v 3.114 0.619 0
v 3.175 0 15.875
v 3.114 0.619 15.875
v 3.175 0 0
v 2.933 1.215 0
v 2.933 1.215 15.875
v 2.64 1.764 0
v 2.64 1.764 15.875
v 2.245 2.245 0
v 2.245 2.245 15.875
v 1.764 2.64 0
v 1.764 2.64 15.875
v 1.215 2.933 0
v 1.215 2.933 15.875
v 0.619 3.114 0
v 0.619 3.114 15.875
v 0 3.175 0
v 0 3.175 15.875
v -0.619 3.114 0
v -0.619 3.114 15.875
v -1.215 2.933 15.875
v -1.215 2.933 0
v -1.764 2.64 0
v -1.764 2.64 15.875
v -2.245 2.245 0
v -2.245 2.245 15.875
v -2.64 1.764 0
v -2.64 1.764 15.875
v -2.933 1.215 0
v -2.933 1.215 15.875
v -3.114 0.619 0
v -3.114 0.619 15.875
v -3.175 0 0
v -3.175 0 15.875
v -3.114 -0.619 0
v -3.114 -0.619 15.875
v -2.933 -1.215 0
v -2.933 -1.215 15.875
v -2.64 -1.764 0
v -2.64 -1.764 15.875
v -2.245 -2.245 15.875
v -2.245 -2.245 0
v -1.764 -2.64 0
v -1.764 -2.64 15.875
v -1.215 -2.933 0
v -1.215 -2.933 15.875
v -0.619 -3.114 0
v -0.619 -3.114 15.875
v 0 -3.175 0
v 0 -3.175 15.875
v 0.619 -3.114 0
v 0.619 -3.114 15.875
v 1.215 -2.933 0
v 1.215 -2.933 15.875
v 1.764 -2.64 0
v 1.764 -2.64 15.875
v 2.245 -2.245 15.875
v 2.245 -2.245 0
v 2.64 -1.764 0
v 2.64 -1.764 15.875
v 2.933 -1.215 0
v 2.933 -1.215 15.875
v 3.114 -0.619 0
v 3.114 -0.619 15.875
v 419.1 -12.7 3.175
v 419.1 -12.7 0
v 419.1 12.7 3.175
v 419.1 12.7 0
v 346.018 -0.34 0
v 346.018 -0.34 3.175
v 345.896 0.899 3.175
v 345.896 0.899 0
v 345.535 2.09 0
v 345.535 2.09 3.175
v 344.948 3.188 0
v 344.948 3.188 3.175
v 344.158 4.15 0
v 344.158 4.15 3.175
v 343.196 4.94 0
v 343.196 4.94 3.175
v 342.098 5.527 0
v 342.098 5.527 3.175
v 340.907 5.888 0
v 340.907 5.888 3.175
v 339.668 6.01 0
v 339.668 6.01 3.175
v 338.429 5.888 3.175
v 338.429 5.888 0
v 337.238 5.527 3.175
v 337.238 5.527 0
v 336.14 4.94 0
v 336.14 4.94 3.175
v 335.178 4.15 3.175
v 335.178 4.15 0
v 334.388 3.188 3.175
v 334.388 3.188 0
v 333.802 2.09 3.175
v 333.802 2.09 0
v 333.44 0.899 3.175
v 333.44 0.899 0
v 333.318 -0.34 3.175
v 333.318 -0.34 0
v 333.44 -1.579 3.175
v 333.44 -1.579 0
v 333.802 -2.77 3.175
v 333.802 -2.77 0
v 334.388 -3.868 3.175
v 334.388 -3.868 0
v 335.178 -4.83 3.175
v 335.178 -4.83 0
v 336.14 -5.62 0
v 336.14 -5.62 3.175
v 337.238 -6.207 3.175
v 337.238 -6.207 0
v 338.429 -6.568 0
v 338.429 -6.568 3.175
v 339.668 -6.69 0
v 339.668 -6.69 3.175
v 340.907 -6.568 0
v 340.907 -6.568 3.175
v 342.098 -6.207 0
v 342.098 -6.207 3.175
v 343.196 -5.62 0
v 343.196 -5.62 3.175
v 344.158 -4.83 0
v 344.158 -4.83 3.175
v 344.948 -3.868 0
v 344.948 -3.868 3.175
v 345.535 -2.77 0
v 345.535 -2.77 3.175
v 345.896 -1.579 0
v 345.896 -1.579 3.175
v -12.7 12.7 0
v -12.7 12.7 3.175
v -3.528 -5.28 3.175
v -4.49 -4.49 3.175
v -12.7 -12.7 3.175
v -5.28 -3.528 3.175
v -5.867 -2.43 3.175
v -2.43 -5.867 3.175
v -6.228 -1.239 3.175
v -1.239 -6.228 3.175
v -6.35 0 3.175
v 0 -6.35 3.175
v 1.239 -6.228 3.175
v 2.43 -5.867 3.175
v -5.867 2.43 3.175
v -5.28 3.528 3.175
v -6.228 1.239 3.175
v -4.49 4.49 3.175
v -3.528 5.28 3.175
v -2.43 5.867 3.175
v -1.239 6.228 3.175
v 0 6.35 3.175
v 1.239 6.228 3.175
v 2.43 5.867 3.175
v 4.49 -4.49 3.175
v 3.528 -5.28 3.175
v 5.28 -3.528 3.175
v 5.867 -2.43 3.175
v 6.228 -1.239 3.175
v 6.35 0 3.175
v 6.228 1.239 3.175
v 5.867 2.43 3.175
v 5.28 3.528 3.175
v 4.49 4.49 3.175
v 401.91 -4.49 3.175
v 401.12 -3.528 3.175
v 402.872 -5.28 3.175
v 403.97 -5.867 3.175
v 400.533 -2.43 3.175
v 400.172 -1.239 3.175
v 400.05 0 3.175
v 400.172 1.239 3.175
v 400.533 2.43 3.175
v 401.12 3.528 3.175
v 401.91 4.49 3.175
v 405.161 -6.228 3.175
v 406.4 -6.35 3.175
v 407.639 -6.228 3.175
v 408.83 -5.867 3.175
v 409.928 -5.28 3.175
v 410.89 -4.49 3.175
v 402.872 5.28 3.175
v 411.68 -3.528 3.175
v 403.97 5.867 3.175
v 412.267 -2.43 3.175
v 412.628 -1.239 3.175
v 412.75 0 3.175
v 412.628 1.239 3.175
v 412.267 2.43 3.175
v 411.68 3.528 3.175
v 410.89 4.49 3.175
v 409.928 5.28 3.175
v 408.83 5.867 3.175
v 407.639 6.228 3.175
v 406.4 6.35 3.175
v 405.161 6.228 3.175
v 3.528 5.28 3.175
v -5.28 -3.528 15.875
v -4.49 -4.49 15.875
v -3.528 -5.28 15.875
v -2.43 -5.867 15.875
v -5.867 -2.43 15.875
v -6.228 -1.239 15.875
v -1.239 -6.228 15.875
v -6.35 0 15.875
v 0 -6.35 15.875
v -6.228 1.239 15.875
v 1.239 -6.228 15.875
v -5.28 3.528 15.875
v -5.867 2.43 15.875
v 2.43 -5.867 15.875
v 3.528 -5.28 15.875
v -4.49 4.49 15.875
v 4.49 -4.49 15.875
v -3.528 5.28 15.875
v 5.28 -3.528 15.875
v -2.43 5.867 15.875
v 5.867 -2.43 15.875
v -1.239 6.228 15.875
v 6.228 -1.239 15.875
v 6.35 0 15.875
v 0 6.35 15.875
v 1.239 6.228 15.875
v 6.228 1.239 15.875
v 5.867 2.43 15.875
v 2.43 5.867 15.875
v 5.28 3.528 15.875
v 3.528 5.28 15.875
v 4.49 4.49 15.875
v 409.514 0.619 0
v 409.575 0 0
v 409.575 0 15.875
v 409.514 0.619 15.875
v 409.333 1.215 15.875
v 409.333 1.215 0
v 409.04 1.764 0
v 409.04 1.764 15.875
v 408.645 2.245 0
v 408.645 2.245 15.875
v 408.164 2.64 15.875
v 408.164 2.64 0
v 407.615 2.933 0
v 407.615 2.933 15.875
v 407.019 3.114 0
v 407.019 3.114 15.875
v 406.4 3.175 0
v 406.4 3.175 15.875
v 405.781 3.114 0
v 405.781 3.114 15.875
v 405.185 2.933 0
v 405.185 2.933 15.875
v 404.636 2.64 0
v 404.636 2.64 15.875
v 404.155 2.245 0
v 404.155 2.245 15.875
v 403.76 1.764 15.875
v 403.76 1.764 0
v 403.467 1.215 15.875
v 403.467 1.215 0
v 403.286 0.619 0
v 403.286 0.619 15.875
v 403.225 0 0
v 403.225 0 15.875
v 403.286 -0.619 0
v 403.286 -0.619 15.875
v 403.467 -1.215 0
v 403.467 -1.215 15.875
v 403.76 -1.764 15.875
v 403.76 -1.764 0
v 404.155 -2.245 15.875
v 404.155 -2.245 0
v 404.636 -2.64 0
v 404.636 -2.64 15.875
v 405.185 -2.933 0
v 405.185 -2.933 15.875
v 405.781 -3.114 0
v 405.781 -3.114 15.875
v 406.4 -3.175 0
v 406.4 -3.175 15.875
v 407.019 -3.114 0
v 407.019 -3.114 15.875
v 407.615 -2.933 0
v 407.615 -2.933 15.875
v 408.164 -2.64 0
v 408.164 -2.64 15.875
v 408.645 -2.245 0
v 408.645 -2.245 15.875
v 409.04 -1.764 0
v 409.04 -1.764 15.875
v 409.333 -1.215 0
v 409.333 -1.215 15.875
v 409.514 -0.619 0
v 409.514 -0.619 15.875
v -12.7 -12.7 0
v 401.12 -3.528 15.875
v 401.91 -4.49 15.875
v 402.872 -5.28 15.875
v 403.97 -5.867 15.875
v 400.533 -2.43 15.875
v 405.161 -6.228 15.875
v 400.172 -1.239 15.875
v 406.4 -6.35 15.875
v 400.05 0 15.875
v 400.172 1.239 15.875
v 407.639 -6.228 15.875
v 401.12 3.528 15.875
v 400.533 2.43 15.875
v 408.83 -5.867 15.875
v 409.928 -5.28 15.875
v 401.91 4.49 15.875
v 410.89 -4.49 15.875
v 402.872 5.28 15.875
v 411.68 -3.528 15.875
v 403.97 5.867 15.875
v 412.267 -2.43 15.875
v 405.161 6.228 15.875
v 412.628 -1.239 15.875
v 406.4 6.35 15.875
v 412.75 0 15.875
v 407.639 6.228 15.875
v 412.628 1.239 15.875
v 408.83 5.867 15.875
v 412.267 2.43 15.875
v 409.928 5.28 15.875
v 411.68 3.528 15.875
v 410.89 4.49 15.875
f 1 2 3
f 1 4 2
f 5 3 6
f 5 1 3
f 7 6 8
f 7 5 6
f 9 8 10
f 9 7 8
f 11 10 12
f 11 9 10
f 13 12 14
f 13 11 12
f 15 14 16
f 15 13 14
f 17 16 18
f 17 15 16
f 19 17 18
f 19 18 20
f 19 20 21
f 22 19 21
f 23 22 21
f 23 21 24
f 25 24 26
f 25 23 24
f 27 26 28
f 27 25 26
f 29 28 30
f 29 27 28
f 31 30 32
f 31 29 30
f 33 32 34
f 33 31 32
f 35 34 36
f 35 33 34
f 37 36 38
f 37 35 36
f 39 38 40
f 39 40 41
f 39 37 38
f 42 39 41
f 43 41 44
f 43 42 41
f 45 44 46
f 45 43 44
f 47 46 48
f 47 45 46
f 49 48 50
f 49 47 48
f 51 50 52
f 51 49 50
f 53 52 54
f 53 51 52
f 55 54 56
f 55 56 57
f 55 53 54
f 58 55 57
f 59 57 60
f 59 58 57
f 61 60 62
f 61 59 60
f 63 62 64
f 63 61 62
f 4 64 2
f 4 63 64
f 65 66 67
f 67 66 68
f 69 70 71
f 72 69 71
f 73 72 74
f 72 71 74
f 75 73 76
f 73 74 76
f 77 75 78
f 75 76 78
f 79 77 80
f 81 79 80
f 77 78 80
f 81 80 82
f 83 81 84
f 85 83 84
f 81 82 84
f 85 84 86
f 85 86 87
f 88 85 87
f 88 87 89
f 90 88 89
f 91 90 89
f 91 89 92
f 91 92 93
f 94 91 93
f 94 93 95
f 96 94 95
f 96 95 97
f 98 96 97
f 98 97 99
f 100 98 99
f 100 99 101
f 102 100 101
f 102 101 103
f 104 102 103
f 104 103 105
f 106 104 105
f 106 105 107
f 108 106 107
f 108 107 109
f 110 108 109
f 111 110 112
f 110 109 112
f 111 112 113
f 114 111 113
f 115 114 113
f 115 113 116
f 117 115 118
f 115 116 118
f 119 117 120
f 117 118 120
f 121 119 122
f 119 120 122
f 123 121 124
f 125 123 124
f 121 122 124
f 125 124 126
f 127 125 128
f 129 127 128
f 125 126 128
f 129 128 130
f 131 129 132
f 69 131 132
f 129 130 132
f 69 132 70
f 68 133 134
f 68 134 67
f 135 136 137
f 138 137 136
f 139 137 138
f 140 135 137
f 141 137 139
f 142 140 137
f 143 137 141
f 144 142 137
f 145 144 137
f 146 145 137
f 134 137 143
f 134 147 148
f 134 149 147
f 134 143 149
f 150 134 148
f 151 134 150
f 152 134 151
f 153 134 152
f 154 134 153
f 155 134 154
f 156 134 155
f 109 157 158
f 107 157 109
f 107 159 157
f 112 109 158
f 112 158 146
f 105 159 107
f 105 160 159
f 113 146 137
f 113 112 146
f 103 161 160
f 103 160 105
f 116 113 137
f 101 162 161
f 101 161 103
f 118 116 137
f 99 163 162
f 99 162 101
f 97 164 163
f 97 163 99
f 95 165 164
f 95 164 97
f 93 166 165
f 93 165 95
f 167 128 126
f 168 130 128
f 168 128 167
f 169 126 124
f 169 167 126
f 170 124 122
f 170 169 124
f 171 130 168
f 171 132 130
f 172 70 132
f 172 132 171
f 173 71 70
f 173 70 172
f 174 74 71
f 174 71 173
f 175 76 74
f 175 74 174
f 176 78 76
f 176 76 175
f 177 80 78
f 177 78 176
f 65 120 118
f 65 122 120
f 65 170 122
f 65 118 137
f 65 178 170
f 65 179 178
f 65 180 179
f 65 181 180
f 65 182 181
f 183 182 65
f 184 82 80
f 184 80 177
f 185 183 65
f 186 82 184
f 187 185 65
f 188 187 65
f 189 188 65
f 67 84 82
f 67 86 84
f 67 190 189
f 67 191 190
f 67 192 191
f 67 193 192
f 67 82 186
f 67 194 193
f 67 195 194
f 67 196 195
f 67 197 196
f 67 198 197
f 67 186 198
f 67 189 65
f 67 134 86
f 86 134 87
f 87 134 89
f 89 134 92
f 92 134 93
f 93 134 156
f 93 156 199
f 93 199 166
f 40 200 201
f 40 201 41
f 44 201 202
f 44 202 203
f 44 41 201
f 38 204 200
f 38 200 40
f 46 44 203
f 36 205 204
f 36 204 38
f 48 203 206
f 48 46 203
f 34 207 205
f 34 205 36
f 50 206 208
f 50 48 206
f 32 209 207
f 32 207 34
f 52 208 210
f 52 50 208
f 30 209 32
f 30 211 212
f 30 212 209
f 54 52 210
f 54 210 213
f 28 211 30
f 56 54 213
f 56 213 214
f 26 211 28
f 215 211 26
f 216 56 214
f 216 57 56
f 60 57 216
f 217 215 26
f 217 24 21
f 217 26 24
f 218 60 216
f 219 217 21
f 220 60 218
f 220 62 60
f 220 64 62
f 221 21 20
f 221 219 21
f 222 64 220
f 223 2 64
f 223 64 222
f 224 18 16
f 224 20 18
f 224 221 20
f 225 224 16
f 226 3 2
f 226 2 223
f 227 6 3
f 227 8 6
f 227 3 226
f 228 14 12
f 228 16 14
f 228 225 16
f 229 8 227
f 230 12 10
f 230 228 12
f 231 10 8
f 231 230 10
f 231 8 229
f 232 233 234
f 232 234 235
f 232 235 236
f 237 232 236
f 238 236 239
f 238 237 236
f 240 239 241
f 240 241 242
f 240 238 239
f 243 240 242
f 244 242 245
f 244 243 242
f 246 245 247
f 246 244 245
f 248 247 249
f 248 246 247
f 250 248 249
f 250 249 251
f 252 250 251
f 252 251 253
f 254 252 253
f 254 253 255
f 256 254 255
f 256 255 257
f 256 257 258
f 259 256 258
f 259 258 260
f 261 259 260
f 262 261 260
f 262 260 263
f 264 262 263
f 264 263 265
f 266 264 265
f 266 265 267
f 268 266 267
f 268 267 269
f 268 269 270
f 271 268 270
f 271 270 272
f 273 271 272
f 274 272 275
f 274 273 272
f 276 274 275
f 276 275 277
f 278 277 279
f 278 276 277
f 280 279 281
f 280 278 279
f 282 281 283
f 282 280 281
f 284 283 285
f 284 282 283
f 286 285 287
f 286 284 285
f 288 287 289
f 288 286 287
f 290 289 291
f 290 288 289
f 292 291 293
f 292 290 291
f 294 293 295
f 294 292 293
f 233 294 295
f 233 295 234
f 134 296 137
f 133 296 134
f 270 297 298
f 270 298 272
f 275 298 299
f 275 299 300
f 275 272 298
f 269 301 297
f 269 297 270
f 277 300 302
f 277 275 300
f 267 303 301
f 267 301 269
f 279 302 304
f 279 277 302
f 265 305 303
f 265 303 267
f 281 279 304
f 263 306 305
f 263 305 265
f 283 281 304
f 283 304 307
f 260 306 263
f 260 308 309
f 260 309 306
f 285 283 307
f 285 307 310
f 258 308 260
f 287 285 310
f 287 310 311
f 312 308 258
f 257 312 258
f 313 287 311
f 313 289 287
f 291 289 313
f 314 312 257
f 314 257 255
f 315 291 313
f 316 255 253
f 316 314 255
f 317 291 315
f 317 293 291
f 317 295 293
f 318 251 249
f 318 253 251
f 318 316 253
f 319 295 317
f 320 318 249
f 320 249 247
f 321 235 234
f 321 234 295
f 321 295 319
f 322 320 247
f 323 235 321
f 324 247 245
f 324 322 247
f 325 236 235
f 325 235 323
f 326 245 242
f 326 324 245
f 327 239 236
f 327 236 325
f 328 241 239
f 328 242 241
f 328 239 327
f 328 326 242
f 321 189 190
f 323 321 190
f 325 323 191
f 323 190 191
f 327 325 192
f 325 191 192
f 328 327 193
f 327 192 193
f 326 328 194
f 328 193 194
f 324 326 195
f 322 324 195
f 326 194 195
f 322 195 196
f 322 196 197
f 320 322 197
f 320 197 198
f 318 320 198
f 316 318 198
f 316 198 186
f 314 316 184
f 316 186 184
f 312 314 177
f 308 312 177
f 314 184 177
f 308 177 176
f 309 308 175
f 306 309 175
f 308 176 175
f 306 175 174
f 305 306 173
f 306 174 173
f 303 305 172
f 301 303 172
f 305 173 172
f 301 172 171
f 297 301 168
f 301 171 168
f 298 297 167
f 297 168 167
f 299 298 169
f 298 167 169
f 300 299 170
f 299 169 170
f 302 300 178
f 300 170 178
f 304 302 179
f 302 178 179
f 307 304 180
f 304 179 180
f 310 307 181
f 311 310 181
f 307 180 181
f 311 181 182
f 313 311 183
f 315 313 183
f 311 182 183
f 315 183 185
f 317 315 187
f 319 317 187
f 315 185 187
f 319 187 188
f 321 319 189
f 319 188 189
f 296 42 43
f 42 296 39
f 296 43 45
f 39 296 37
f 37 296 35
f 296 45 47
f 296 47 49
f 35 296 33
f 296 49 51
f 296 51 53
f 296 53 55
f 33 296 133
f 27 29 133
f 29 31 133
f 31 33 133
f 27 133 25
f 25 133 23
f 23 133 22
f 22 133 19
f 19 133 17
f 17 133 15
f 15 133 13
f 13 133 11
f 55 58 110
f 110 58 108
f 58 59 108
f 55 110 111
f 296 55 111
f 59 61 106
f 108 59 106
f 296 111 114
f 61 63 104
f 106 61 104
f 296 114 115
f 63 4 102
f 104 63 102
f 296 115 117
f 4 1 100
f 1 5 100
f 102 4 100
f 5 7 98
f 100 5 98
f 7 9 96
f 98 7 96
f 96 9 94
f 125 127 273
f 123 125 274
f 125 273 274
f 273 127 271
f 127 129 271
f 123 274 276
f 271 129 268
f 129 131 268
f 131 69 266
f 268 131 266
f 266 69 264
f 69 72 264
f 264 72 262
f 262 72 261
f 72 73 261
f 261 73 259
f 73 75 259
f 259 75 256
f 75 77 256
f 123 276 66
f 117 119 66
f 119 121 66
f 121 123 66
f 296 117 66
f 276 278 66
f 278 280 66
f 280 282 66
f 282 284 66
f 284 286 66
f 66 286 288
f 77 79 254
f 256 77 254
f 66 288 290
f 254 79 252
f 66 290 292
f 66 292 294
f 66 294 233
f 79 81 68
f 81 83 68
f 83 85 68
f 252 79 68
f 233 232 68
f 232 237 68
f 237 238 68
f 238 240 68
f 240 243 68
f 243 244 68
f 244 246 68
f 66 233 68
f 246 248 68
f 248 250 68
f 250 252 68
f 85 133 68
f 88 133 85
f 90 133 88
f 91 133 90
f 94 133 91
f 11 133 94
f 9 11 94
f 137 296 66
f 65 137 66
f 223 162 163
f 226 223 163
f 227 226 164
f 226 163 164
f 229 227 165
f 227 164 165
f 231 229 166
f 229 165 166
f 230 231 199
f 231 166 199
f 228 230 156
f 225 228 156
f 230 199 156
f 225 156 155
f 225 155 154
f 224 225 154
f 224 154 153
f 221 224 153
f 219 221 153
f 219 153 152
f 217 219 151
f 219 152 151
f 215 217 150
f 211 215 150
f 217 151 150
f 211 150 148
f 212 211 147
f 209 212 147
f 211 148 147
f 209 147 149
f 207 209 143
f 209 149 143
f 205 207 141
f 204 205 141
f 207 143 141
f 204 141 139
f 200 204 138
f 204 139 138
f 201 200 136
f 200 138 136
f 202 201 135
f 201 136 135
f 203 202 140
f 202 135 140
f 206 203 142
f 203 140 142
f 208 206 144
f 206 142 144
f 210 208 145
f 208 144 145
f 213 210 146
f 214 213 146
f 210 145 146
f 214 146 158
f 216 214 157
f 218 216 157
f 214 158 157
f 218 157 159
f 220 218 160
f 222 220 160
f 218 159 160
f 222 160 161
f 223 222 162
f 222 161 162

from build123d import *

# Parameters (mm, degrees)
SKETCH1_W           = 431.8
SKETCH1_H           = 25.4
SKETCH1_R           = 3.175
BOSS_EXTRUDE1_DEPTH = 3.175
SKETCH2_R           = 6.35
SKETCH2_R_2         = 3.175
BOSS_EXTRUDE2_DEPTH = 12.7
CUT_EXTRUDE1_REACH  = 5.175
SKETCH3_R           = 6.35


with BuildPart() as part:
    # Sketch1 → Boss-Extrude1 (new body)
    with BuildSketch(Plane.XY):
        with Locations((203.2, 0)):
            Rectangle(SKETCH1_W, SKETCH1_H)
        Circle(SKETCH1_R, mode=Mode.SUBTRACT)
        with Locations((406.4, 0)):
            Circle(SKETCH1_R, mode=Mode.SUBTRACT)
    extrude(amount=BOSS_EXTRUDE1_DEPTH)

    # Sketch2 → Boss-Extrude2 (add)
    with BuildSketch(Plane.XY.offset(3.175)):
        Circle(SKETCH2_R)
        Circle(SKETCH2_R_2, mode=Mode.SUBTRACT)
        with Locations((406.4, 0)):
            Circle(SKETCH2_R)
        with Locations((406.4, 0)):
            Circle(SKETCH2_R_2, mode=Mode.SUBTRACT)
    extrude(amount=BOSS_EXTRUDE2_DEPTH)

    # Sketch3 → Cut-Extrude1 (cut, up to next)
    with BuildSketch(Plane.XY.offset(3.175), mode=Mode.PRIVATE) as cut_extrude1_sk1:
        with Locations((339.668299959, -0.339967612)):
            Circle(SKETCH3_R)
    cut_extrude1_tool1 = extrude(cut_extrude1_sk1.sketch, amount=-CUT_EXTRUDE1_REACH, mode=Mode.PRIVATE) & part.part
    add(cut_extrude1_tool1.solids().sort_by_distance((339.6683, -0.339968, 3.175))[0], mode=Mode.SUBTRACT)


solid = part.part
